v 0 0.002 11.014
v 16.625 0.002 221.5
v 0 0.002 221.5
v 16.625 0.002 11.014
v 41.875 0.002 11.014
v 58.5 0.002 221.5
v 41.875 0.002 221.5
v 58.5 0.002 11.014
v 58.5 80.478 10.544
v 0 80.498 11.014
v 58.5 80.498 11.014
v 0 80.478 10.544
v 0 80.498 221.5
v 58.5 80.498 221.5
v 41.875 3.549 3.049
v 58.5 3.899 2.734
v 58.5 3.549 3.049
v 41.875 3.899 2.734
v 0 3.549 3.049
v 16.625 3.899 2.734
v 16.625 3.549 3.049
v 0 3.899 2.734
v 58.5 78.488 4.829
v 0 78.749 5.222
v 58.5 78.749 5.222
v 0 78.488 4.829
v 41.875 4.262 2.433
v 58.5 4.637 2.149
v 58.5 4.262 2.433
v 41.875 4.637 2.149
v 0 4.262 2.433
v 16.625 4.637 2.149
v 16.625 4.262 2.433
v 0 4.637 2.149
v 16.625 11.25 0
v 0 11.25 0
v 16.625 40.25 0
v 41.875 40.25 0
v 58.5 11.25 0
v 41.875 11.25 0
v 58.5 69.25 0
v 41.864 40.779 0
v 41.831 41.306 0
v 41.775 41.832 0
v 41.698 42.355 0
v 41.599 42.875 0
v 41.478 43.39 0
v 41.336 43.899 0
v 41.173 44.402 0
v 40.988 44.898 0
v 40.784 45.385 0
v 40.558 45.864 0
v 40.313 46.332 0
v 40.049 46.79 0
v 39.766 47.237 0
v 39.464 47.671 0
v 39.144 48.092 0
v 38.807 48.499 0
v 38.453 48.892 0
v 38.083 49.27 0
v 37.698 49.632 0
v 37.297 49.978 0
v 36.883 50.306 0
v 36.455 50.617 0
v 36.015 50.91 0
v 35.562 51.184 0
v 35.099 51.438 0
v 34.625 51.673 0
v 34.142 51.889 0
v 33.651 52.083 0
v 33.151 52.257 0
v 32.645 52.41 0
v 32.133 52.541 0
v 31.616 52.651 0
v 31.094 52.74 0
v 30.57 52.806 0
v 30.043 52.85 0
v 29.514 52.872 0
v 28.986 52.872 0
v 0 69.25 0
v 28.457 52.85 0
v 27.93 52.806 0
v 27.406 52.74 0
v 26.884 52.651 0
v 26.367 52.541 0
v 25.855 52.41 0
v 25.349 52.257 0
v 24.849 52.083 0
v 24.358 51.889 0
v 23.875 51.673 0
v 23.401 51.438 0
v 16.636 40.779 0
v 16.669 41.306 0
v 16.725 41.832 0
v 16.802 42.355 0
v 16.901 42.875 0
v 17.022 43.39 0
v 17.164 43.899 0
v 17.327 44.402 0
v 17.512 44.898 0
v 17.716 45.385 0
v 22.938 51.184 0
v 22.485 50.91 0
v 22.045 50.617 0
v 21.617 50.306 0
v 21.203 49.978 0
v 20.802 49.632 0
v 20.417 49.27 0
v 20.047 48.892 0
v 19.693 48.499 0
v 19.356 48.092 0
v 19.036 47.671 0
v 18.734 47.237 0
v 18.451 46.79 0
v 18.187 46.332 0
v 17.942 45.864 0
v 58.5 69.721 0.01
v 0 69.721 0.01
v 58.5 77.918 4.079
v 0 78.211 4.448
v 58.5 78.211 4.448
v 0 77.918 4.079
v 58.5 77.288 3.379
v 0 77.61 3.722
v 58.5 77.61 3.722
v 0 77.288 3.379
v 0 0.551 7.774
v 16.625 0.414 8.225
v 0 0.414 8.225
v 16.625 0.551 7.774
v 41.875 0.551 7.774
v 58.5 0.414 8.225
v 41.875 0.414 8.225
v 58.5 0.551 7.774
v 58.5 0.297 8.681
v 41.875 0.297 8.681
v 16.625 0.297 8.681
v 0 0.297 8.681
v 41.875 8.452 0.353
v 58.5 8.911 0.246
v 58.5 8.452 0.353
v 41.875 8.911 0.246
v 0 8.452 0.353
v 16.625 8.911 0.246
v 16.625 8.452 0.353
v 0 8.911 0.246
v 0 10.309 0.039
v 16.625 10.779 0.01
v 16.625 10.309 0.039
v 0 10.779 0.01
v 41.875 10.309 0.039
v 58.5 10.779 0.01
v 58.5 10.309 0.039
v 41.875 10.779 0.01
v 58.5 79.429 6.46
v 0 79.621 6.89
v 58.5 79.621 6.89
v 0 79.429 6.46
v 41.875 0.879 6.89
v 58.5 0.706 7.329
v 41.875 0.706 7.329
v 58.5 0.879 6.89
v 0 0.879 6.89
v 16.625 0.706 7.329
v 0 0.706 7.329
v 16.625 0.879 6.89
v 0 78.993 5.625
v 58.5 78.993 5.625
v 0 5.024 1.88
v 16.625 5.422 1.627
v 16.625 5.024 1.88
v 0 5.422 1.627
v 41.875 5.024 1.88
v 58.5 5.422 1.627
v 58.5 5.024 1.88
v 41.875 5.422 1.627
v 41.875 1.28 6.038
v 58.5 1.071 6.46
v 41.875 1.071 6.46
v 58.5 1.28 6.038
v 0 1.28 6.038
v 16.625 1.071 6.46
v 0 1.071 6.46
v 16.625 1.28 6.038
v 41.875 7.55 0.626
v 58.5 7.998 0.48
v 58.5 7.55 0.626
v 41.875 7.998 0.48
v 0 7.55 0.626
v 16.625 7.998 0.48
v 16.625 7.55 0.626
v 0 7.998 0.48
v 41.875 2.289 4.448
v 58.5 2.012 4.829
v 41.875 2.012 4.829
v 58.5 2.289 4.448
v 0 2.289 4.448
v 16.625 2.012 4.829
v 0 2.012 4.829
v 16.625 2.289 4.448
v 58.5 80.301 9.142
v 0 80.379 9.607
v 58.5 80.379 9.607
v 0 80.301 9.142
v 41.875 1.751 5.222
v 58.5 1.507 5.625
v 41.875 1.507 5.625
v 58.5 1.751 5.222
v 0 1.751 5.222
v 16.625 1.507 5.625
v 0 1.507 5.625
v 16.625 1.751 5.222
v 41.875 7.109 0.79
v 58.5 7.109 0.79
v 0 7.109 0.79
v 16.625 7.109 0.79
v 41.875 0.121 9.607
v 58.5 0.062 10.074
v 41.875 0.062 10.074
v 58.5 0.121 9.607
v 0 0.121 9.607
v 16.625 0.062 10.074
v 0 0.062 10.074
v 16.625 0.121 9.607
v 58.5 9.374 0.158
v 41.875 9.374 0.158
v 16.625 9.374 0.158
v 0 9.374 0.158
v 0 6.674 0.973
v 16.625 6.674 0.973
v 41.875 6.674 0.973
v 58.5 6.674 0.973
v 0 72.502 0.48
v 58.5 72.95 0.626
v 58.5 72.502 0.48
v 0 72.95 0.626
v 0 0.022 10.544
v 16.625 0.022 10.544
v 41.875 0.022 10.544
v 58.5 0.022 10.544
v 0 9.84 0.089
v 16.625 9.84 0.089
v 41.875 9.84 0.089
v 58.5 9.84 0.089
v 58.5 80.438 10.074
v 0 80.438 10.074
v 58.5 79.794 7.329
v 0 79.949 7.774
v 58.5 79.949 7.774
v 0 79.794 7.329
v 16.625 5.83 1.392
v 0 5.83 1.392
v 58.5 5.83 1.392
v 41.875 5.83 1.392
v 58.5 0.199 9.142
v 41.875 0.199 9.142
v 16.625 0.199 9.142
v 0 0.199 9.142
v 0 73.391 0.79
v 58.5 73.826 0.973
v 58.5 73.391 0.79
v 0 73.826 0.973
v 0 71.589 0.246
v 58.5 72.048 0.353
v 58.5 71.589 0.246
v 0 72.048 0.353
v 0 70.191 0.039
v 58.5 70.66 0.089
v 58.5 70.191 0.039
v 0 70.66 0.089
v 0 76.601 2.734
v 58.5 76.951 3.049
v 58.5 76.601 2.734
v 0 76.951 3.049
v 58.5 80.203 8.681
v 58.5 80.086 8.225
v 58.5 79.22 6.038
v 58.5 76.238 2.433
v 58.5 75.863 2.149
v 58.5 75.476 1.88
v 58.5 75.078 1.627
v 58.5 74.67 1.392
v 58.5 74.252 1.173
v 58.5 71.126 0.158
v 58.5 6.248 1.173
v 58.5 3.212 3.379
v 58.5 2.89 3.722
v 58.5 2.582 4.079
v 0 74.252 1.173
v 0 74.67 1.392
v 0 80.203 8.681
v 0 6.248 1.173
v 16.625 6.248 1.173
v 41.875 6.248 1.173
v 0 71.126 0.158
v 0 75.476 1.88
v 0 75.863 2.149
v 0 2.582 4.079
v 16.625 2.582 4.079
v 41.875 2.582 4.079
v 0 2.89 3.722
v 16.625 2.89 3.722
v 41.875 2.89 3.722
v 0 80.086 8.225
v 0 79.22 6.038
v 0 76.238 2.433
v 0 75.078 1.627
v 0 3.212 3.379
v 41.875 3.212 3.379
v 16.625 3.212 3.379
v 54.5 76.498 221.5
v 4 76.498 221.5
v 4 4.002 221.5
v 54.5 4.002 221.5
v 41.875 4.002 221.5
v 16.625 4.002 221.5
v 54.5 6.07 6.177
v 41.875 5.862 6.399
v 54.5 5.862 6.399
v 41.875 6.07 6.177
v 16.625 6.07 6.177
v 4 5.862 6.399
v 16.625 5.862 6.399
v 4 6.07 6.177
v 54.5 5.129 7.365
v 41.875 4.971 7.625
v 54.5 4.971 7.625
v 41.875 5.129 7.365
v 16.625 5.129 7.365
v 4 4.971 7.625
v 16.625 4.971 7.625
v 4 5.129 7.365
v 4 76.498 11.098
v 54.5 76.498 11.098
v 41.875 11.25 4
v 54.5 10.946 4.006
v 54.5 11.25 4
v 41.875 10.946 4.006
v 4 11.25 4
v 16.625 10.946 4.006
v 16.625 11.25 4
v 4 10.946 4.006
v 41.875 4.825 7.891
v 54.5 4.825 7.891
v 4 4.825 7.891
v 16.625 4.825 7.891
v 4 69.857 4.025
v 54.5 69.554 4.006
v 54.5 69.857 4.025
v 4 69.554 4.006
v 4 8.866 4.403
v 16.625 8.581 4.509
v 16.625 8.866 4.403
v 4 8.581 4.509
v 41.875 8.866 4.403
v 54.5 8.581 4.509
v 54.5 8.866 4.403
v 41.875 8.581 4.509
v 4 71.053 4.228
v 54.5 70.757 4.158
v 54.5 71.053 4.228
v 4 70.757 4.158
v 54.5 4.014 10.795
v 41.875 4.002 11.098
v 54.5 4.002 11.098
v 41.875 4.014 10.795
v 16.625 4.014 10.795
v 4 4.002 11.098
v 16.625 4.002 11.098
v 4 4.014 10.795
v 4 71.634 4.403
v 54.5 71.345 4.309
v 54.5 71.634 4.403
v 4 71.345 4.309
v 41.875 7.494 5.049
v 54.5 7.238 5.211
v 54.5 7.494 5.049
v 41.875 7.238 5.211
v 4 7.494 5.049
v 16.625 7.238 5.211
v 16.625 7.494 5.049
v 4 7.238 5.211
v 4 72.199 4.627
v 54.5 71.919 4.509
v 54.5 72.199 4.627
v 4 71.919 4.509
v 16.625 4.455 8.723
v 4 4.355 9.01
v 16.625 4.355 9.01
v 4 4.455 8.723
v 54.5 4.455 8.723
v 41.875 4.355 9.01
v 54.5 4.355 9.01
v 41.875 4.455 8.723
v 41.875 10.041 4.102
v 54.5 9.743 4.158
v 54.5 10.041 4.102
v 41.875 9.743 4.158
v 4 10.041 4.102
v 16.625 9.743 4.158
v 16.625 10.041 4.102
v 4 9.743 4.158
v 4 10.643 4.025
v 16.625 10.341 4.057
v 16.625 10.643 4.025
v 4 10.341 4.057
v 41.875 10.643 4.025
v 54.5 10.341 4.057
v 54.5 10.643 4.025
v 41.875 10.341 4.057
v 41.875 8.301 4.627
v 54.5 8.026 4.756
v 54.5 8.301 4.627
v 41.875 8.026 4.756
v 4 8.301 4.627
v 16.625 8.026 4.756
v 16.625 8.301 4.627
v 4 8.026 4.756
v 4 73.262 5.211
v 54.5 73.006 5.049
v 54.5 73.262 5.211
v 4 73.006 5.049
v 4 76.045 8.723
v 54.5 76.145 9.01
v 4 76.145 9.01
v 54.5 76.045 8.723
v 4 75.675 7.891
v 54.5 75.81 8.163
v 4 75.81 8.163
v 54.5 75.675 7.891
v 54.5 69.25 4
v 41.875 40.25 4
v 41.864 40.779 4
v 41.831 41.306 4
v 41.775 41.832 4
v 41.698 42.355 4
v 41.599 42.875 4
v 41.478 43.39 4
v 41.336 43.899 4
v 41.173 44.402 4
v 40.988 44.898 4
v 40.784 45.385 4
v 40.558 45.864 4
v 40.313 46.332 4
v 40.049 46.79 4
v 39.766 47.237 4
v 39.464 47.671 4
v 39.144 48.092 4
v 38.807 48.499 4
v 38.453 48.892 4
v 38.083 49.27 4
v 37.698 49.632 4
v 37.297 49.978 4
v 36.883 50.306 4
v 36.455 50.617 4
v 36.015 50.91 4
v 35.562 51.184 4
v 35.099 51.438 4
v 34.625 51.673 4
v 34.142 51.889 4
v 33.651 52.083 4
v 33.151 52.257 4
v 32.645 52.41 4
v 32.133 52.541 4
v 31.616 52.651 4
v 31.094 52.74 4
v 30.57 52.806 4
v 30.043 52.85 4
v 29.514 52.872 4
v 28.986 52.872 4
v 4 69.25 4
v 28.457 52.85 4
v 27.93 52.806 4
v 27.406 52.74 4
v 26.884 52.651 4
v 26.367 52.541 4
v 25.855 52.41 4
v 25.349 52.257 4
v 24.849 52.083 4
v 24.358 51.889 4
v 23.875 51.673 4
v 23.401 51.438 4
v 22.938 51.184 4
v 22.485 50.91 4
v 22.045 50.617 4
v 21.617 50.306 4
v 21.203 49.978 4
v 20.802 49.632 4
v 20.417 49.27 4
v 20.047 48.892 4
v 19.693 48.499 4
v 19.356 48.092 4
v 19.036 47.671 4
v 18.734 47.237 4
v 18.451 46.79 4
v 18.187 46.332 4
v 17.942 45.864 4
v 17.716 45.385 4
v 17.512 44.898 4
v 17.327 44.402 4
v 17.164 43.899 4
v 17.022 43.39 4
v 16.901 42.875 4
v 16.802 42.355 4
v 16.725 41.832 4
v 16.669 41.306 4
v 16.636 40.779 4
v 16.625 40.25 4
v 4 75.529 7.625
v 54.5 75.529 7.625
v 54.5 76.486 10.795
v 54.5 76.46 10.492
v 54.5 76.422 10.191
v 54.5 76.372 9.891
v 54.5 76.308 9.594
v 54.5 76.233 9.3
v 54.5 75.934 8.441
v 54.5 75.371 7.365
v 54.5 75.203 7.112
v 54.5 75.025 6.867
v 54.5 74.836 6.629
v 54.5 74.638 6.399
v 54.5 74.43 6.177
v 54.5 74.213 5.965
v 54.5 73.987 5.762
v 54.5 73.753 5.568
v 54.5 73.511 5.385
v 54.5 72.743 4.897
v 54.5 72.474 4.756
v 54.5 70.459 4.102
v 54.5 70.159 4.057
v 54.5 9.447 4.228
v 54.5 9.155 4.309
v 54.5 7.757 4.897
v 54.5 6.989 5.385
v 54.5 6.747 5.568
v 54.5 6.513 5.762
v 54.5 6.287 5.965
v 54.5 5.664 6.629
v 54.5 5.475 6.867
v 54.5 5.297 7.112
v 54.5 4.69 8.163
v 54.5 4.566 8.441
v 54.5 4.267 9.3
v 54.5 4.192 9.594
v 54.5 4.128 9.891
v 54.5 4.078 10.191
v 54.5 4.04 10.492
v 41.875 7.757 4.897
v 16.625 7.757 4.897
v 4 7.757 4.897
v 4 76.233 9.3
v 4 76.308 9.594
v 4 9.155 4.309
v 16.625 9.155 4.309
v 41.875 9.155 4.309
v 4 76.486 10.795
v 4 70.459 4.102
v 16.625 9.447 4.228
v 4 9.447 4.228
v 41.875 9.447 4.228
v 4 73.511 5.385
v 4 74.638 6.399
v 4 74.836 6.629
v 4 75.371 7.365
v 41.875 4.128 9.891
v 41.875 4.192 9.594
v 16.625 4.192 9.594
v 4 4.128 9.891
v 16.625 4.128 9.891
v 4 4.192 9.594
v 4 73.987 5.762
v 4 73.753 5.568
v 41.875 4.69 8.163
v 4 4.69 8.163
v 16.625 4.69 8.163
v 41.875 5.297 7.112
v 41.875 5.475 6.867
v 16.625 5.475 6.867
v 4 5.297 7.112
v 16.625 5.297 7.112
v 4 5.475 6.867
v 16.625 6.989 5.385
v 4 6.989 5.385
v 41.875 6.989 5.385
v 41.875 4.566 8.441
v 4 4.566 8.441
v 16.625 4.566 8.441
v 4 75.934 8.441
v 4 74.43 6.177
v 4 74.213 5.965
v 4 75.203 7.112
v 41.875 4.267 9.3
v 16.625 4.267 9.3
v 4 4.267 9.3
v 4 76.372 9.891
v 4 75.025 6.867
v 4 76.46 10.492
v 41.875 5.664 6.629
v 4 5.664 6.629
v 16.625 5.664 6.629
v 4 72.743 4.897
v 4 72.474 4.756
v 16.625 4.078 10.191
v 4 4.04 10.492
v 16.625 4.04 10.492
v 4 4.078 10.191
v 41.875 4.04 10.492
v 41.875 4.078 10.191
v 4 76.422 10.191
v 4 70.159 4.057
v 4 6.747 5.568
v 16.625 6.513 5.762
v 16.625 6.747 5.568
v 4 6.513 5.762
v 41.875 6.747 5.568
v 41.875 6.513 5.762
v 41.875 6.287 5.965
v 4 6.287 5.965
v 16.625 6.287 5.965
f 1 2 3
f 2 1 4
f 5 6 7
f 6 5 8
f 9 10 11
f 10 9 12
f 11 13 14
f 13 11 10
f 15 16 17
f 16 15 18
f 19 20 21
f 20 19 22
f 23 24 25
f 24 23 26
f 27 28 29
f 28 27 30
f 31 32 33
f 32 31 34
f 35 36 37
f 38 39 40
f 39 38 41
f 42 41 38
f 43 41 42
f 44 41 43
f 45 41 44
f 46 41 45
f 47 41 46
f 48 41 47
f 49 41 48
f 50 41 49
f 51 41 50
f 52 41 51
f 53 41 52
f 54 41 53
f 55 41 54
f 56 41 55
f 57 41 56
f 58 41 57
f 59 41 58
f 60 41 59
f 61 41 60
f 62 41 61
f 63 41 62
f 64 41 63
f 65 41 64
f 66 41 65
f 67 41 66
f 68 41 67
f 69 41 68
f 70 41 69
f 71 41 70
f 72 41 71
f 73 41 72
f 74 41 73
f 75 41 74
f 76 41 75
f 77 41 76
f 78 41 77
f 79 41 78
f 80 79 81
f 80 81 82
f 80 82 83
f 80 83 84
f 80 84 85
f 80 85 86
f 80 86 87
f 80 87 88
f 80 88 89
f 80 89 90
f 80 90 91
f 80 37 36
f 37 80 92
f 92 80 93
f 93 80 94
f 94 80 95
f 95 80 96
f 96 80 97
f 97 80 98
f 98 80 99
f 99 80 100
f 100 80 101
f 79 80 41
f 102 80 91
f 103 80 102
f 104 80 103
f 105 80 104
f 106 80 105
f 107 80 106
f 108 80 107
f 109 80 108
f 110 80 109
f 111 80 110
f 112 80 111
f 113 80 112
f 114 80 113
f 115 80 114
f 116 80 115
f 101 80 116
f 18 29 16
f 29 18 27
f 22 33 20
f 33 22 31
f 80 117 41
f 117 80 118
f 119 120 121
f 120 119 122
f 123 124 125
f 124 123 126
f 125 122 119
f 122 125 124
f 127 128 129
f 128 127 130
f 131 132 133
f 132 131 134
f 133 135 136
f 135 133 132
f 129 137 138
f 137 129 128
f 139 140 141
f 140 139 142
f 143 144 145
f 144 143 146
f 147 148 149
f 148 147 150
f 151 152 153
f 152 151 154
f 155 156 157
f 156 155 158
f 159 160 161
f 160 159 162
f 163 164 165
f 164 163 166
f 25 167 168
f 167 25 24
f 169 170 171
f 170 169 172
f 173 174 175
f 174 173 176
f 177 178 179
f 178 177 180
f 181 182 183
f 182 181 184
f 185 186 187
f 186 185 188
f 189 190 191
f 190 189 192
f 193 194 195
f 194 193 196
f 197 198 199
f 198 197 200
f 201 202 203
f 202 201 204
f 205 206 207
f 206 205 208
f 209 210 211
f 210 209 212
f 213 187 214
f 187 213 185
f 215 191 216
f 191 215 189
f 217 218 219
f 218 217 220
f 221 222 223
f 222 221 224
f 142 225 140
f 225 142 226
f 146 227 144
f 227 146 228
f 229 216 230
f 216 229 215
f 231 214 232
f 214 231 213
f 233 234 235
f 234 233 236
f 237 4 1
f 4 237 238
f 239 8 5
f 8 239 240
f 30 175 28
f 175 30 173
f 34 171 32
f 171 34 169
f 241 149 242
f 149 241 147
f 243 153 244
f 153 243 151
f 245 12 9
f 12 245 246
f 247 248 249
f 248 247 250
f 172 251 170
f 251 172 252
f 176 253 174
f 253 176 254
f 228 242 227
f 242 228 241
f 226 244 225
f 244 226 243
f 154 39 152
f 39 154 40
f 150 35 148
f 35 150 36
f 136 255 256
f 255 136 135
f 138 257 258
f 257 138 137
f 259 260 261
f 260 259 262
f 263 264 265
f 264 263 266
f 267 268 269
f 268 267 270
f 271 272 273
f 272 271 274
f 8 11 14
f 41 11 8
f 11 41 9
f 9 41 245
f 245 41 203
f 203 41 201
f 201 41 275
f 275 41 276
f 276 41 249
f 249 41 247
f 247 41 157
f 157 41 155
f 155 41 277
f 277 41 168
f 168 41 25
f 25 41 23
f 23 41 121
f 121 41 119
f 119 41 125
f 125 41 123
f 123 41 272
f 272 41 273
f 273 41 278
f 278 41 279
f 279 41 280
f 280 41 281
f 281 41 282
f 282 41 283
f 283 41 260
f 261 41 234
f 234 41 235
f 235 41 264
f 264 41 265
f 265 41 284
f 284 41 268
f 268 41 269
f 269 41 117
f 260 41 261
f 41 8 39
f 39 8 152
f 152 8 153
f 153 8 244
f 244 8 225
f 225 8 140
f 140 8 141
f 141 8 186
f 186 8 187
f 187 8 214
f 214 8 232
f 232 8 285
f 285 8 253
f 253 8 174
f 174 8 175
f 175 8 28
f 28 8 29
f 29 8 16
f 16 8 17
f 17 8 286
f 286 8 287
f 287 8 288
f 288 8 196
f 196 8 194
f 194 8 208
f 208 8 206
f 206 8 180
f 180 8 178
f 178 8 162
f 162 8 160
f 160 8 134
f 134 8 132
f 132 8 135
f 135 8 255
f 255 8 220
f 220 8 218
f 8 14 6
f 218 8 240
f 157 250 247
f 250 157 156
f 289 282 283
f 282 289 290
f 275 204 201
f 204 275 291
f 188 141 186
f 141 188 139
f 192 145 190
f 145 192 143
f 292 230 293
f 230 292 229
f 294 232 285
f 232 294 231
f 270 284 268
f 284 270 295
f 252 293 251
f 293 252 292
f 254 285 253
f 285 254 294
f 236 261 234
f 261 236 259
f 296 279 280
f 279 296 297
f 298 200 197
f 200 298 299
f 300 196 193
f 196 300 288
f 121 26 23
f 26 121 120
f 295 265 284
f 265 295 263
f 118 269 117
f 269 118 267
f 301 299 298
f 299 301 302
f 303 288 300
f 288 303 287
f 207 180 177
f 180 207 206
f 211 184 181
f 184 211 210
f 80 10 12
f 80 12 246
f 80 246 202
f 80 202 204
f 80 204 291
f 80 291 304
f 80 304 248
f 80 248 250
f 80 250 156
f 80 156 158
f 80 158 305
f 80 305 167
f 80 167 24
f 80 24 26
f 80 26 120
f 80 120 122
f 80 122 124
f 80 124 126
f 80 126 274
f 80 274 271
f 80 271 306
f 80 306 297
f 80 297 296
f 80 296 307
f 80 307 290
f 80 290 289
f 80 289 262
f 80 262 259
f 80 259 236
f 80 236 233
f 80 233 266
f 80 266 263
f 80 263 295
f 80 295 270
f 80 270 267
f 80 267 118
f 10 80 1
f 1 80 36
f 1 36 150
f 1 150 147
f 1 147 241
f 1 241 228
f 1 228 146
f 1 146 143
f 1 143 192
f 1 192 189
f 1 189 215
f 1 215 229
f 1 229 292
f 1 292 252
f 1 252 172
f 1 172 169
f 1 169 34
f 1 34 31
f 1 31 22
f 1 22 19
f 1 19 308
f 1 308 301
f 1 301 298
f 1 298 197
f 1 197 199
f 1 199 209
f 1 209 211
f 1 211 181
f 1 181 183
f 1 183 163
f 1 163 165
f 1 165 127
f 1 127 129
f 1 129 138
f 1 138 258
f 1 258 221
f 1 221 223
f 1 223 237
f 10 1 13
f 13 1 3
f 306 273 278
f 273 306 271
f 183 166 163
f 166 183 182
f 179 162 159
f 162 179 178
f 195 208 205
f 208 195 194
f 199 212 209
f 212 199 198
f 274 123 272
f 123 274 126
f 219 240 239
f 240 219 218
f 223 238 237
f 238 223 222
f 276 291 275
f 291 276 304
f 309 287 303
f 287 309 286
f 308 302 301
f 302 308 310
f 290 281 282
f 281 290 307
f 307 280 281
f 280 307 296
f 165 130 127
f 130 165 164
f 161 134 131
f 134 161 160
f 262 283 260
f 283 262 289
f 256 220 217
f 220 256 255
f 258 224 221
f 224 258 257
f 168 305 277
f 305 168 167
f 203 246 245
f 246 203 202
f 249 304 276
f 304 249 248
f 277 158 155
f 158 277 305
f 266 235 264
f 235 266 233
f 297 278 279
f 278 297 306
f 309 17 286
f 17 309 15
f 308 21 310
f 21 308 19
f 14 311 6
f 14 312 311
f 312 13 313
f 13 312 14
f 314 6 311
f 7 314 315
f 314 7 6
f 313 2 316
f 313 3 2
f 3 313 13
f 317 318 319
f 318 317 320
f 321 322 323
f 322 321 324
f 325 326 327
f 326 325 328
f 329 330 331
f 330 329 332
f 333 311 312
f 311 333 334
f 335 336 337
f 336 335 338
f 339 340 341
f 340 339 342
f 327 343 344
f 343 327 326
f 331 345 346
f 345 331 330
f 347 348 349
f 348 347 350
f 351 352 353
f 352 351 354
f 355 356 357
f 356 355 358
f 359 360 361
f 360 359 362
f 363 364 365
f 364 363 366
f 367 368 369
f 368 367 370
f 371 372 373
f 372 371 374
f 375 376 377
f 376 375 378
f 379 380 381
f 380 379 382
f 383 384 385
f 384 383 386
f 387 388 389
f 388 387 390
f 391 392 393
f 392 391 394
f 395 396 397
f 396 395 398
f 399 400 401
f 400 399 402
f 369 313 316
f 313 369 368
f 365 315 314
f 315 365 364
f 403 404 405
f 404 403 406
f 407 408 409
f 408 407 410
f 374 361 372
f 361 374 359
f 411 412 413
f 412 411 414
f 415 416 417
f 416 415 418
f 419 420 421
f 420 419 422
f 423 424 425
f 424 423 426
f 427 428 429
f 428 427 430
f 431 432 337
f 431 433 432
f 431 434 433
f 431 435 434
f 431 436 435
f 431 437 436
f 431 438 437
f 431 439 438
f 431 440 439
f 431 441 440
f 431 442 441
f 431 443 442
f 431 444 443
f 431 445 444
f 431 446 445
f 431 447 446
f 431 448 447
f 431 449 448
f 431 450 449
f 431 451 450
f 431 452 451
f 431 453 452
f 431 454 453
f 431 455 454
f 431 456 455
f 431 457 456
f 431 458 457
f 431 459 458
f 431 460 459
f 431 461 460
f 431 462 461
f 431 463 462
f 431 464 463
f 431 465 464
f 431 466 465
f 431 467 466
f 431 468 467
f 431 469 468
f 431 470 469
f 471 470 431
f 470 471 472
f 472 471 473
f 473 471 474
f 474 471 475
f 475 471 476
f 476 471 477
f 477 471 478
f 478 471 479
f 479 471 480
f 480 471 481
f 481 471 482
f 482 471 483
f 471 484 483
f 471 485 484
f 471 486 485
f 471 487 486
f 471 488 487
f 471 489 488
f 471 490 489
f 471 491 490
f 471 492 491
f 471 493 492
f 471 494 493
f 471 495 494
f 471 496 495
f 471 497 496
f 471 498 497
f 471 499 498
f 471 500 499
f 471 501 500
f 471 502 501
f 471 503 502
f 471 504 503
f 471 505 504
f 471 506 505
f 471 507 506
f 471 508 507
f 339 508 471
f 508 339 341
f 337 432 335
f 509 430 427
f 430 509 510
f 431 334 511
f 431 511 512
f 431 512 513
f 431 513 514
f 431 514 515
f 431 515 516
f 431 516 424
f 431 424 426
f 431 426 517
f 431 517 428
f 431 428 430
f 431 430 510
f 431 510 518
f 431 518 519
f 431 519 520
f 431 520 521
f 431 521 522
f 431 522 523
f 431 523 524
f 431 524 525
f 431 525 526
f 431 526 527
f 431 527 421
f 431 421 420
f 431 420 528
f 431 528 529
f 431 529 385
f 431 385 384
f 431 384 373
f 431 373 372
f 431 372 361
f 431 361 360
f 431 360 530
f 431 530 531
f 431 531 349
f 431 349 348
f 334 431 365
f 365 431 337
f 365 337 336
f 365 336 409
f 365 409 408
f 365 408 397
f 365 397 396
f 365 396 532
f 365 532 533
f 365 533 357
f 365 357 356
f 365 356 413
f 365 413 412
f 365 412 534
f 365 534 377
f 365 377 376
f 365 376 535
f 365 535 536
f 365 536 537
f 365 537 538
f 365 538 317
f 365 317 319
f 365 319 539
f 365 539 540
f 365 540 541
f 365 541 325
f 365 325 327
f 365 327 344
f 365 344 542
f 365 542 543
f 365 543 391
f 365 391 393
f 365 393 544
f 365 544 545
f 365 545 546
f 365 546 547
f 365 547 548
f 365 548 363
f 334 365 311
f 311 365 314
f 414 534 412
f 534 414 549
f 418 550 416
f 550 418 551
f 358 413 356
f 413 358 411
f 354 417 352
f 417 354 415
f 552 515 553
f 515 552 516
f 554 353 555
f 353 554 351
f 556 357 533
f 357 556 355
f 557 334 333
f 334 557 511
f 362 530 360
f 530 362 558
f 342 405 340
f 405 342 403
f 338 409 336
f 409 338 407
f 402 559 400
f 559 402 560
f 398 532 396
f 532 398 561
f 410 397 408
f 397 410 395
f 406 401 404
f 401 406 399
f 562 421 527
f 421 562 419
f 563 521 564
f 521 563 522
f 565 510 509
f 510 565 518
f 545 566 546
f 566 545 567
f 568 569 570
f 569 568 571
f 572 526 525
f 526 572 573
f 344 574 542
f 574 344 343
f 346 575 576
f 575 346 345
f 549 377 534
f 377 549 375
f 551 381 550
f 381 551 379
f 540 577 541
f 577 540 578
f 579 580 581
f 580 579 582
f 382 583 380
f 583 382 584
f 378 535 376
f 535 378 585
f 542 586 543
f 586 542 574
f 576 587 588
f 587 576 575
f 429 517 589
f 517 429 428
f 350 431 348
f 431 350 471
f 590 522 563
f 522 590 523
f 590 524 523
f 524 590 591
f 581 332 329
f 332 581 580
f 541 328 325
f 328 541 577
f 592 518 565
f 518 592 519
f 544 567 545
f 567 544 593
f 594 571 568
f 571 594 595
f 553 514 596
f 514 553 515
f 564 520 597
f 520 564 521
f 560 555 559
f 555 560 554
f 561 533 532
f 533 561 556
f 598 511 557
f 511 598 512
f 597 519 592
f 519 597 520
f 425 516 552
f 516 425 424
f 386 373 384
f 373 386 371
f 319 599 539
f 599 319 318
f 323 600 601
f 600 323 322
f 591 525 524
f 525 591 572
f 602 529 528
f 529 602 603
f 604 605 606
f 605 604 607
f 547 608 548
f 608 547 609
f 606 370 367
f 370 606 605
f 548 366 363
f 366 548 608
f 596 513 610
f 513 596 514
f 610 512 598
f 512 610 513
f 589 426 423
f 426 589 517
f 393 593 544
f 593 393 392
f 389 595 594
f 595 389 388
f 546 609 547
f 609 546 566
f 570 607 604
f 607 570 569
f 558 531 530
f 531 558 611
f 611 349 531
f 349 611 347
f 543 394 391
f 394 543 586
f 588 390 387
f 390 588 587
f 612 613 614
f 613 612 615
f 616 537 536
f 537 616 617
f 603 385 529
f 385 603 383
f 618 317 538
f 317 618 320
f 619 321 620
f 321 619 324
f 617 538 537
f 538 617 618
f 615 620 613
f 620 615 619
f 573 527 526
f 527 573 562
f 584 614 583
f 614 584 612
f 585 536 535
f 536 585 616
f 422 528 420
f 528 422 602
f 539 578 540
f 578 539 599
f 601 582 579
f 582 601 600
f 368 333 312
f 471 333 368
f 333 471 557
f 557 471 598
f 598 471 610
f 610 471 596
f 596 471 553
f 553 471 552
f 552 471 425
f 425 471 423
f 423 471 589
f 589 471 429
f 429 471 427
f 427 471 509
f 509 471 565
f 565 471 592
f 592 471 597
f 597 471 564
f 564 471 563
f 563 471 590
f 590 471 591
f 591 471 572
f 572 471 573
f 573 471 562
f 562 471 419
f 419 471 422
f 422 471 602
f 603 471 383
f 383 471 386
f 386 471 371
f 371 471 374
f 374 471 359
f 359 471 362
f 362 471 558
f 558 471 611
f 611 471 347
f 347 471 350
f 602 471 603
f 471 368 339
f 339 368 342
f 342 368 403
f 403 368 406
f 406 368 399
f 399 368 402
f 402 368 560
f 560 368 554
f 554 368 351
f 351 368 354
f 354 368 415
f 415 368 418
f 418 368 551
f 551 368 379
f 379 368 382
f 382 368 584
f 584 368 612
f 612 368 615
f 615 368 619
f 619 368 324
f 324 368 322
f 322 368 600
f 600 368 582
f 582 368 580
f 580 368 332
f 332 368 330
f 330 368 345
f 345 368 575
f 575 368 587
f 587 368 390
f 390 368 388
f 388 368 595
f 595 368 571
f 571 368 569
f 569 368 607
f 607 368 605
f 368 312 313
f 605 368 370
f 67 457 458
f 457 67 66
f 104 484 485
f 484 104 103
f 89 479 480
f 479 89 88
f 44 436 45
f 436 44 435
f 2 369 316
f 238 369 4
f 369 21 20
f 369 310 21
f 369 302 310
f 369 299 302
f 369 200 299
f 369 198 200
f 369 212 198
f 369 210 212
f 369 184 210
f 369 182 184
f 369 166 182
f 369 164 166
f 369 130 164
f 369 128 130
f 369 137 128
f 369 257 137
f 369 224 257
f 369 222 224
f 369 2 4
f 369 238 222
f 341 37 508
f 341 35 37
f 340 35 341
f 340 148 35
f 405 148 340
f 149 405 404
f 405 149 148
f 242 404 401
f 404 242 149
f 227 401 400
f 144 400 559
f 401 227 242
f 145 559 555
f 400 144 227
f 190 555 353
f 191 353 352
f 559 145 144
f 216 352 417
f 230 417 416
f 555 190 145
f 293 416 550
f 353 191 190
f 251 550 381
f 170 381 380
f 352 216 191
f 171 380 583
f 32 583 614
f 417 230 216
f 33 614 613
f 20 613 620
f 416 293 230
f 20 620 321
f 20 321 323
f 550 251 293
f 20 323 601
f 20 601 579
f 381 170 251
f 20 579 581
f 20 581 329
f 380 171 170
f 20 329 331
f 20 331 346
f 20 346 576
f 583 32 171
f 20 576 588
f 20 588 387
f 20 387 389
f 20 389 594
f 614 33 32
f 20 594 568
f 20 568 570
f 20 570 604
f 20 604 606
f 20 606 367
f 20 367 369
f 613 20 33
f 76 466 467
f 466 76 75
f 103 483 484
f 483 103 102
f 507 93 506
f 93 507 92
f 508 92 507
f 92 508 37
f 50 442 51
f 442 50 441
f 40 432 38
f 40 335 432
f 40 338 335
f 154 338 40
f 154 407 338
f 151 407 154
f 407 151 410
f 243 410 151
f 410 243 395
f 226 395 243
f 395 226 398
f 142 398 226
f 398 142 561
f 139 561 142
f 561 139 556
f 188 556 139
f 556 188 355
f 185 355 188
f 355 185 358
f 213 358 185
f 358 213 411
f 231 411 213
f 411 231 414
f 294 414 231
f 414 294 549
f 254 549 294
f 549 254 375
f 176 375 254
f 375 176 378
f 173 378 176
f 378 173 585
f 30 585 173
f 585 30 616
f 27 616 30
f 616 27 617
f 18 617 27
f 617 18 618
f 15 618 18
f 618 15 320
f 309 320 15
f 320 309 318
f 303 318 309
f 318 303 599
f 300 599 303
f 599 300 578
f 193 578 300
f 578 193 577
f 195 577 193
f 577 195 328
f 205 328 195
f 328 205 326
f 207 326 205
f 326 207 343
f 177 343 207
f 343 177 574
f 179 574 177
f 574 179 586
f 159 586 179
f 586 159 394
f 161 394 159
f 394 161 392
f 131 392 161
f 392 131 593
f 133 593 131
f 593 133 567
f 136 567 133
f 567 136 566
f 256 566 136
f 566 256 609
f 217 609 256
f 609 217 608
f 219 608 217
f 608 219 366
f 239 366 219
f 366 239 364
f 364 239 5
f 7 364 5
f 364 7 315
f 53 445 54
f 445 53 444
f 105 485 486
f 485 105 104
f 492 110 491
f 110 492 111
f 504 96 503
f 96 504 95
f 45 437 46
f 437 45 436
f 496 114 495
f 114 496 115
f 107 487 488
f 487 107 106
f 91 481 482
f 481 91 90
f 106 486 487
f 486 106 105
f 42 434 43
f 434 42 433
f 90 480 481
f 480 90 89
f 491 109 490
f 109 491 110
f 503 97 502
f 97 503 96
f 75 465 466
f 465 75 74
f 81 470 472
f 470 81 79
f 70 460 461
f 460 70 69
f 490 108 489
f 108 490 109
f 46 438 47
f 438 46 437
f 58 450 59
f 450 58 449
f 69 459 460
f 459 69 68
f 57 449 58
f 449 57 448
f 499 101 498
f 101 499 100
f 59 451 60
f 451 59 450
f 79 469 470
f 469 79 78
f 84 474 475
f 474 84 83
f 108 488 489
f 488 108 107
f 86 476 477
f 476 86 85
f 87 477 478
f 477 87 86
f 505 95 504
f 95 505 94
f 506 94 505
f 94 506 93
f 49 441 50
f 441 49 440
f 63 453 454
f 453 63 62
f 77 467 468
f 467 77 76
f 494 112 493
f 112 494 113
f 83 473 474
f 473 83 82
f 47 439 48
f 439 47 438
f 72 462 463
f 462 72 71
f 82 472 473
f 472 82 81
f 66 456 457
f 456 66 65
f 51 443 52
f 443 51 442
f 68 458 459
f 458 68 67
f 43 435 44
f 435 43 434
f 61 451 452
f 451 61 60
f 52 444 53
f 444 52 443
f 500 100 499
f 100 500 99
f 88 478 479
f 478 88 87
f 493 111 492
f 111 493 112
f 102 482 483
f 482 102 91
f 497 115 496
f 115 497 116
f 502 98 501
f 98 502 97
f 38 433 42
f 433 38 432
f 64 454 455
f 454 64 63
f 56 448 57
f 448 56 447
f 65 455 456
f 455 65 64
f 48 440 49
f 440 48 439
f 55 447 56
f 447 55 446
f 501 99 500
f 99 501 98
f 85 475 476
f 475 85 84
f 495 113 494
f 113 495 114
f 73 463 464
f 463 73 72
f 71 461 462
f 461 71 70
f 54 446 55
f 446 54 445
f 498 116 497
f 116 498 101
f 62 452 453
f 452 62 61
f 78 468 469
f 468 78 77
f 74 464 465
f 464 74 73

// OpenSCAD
//=============================================================================
// battery-tower.scad
//
// A simple container for holding batteries with a slot down the side to make
// it easier to remove them later.
//=============================================================================
// Written in 2018 by Patrick Barrett
//
// To the extent possible under law, the author(s) have dedicated all copyright
// and related and neighboring rights to this work to the public domain
// worldwide. This work is distributed without any warranty.
//
// See <http://creativecommons.org/publicdomain/zero/1.0/> for full dedication.
//=============================================================================

//=============================================================================
// dimensions
//=============================================================================

wall = 4;

// default: AA sized
batt_d = 14.5;
batt_h = 50.5;

cavity_count_h = 15; // # of batteries tall
cavity_count_l = 5; // # of battries long (deep)
cavity_count_w = 1; // # of battries wide

slot_proportion = 1/2;

cavity_h = cavity_count_h * batt_d;
cavity_l = cavity_count_l * batt_d;
cavity_w = cavity_count_w * batt_h;
cavity_r = batt_d/2;

body_h = cavity_h + wall;
body_l = cavity_l + 2*wall;
body_w = cavity_w + 2*wall;
body_r = cavity_r + wall;

slot_w = batt_h * slot_proportion;

$fn = 150;

abit = 0.05;
alot = 1000;

//=============================================================================
// modules
//=============================================================================

module rounded_rect_3d(dim, r) {
    x = dim[2];
    y = dim[1];
    z = dim[0];
    
    // limit diameter to half of x or y
    rl = r > x/2 ? x/2 : (r > y/2 ? y/2 : r);
    
    rotate([0,90,0])
    translate([-x, 0, 0])
    hull() {
        translate([rl, rl, 0])
        cylinder(r = rl, h = z);
        
        translate([x-rl, rl, 0])
        cylinder(r = rl, h = z);
        
        translate([x-rl, y-rl, 0])
        cylinder(r = rl, h = z);
        
        translate([rl/2, y-rl, 0])
        cylinder(r = rl, h = z);
    }
}



//=============================================================================
// main soild
//=============================================================================

difference() {
    // main mass
    intersection() {
        // for rounded bottom
        rounded_rect_3d([body_w, body_l, alot], body_r);
        
        // for square top
        cube([body_w, body_l, body_h]);
    }

    // main cavity
    translate([wall, wall, wall])
    rounded_rect_3d([cavity_w, cavity_l, alot], cavity_r);
    
    // side slot
    hull() {
        translate([body_w/2, body_l/2, -abit])
        cylinder(d = slot_w, h = alot);
        
        translate([body_w/2, -body_l/2, -abit])
        cylinder(d = slot_w, h = alot);
    }
}
